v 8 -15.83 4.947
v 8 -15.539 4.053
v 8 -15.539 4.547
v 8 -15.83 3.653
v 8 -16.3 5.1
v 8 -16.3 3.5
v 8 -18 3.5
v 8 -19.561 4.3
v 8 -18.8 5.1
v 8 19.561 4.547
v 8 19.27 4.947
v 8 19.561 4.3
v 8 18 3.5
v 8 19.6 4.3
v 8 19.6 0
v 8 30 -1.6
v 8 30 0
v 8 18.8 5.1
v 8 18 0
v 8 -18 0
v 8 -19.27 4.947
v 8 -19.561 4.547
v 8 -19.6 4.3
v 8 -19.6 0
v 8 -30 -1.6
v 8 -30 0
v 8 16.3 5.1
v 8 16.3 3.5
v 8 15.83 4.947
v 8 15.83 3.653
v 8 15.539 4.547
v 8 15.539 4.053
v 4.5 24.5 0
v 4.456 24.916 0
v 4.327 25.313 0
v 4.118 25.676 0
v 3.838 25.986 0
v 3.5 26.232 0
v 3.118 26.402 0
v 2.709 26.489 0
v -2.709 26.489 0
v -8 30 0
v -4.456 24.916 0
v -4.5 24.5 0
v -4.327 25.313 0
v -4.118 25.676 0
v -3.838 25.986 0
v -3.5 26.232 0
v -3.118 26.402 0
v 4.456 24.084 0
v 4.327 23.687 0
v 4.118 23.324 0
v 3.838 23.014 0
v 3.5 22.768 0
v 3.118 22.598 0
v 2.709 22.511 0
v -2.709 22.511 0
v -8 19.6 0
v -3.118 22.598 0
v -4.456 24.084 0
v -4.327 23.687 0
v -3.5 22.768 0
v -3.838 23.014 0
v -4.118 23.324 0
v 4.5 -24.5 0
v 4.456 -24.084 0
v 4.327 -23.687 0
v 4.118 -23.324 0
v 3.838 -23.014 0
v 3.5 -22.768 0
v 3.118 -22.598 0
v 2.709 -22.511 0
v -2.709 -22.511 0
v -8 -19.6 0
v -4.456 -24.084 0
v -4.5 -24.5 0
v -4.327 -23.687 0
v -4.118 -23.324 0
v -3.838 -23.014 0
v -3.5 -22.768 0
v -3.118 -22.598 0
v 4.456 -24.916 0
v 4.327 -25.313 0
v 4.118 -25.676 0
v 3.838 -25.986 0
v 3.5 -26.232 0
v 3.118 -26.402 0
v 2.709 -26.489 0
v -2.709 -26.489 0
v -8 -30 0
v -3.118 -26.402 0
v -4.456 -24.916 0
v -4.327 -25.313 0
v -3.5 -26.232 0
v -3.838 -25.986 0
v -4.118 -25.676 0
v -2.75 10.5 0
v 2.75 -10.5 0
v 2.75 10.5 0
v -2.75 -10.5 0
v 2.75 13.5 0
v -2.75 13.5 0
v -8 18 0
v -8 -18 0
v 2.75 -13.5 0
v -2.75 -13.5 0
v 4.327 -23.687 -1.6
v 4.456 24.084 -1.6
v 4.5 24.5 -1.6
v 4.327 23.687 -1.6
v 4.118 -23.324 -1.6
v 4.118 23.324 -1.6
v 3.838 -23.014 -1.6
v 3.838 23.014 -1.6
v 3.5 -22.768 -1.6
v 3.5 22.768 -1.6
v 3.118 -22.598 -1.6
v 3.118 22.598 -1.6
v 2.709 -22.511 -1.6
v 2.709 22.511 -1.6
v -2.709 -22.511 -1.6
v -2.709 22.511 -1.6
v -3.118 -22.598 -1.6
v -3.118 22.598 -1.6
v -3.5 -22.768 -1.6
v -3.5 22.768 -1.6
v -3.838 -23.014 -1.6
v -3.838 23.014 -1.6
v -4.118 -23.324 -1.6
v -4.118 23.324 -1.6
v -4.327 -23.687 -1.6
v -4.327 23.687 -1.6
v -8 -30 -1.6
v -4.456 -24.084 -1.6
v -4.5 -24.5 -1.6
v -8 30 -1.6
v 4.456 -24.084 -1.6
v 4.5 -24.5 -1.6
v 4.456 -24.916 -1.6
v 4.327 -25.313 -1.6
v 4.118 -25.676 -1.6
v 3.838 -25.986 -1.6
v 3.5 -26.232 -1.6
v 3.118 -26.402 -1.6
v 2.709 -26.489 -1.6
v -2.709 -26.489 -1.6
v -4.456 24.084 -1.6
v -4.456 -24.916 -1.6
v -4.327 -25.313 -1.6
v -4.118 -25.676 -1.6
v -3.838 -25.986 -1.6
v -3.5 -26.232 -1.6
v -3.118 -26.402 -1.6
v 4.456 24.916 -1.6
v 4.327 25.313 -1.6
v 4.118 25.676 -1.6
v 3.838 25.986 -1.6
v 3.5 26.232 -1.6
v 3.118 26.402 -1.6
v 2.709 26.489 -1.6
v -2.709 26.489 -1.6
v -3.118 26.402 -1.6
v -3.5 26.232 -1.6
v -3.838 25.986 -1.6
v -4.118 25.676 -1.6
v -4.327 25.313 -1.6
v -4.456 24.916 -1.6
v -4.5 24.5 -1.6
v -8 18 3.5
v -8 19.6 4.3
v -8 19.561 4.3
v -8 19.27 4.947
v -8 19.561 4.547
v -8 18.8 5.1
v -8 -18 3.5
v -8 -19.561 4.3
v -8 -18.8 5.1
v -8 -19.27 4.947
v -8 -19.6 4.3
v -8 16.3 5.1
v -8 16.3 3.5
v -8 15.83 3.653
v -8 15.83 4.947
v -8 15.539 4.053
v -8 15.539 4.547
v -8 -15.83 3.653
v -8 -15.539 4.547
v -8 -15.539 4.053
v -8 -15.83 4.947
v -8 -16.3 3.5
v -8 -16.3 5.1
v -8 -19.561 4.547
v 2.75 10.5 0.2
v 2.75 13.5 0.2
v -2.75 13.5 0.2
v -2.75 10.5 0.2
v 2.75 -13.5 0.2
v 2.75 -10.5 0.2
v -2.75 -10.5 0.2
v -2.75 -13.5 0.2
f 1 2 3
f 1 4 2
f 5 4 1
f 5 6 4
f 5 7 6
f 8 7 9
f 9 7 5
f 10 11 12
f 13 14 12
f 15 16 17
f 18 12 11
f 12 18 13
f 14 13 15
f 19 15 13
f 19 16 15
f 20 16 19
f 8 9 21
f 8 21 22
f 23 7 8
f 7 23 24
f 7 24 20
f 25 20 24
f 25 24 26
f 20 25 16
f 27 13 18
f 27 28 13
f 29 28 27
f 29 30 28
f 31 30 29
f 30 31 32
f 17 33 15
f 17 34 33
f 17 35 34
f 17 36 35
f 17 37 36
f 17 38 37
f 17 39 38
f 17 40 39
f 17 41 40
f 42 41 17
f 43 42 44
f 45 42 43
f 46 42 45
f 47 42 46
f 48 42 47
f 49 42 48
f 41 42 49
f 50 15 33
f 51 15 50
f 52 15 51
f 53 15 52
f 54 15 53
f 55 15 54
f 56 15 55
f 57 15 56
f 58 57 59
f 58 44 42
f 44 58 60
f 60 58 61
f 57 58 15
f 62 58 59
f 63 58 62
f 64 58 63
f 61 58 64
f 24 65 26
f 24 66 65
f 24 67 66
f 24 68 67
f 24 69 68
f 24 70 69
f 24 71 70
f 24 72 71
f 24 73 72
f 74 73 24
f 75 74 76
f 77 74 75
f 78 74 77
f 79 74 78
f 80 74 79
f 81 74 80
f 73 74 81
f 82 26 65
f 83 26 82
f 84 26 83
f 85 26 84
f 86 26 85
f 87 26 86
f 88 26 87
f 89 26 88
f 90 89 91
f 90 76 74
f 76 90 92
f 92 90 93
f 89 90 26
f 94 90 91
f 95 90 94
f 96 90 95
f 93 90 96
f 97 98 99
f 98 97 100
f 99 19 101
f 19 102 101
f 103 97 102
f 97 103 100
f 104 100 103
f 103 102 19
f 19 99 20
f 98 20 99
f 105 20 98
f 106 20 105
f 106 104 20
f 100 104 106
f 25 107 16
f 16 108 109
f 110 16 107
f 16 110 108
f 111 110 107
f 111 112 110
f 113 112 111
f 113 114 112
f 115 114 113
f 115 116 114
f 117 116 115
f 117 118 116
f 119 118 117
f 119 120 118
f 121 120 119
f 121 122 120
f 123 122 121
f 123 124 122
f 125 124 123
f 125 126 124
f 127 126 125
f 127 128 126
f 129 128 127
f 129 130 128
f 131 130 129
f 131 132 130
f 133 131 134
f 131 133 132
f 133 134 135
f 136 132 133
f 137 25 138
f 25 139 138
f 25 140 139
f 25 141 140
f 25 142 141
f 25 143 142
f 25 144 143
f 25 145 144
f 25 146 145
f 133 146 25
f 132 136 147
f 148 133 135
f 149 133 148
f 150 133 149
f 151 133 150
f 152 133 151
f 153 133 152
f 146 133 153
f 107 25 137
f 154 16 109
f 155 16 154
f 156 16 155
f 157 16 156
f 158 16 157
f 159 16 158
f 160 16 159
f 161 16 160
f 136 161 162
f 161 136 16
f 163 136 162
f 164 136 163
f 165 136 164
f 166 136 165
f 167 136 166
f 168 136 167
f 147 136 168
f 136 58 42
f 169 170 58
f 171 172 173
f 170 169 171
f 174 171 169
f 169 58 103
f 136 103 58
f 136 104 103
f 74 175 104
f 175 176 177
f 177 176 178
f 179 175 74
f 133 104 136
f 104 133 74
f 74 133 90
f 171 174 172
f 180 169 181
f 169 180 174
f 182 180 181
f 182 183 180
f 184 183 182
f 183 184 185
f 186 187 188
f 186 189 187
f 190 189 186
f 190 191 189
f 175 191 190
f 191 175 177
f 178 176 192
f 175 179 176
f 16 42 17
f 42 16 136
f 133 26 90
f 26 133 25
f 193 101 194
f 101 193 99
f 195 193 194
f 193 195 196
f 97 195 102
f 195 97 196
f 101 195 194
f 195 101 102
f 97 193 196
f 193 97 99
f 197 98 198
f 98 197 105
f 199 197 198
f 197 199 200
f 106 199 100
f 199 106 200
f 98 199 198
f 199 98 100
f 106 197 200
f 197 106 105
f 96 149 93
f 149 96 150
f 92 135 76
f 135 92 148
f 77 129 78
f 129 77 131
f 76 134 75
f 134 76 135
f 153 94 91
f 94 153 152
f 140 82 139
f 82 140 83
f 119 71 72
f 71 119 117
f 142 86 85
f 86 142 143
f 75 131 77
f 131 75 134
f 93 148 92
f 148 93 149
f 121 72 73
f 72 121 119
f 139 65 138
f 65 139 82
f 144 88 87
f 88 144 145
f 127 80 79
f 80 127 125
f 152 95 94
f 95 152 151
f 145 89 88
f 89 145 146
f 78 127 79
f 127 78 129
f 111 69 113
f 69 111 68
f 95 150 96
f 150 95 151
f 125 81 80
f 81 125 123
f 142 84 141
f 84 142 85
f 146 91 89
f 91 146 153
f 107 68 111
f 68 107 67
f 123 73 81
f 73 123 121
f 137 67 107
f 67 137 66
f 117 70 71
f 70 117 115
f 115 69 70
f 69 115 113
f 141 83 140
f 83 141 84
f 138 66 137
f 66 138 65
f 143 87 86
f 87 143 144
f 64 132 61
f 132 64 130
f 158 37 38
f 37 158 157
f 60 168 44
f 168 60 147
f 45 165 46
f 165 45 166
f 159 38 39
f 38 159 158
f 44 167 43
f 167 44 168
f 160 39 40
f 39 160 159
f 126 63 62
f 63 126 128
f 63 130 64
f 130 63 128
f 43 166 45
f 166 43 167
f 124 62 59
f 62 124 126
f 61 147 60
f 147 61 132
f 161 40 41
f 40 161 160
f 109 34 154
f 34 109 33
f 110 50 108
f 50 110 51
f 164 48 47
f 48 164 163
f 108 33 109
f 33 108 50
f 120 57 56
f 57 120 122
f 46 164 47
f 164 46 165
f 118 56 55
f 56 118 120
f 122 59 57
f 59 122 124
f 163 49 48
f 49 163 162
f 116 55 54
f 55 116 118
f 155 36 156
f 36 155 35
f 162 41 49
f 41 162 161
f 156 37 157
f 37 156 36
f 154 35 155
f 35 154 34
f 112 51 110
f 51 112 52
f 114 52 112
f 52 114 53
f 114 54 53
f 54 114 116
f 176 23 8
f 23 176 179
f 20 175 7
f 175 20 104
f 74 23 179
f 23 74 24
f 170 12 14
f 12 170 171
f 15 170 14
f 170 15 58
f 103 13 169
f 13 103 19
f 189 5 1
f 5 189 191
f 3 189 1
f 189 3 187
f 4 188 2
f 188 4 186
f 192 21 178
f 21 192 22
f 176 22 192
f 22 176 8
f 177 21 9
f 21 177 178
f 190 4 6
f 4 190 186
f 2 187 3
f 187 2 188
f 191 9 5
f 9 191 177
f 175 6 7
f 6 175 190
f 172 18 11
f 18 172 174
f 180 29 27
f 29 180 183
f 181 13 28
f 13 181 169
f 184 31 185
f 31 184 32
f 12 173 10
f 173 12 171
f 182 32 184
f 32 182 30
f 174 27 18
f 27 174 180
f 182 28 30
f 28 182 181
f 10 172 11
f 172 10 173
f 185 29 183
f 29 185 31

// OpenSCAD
// base plate
bw=16;
bl=60;
bt=1.6;

// mount
mw=16;
ml=36;
mh=3.5;
mt=1.6;
ma=2.5; // arms

//pads
pw=5.5;
pl=3;
ph=0.2;
po=12;

// holes
hd=4;
hl=5;
ho=24.5;

module hole(offset, diam)
{
  hull()
  {
    translate([-hl/2, offset, -1]) cylinder(h=bt*2+2, d=diam, center=true, $fn=30);
    translate([ hl/2, offset, -1]) cylinder(h=bt*2+2, d=diam, center=true, $fn=30);
  }
}

//rotate([0,90,0])
{
    difference()
    {
      union()
      {
        translate([-bw/2, -bl/2, -bt]) cube([bw, bl, bt]);

        translate([0, po,0]) cube([pw, pl, ph*2], center=true);
        translate([0,-po,0]) cube([pw, pl, ph*2], center=true);
      }
      hole(-ho, hd);
      hole(ho, hd);
    }

    translate([-bw/2, -ml/2-mt, -bt]) cube([mw, mt, bt+mh+mt/2]);
    translate([-bw/2,  ml/2, -bt]) cube([mw, mt, bt+mh+mt/2]);

    hull()
    {
        translate([0, -ml/2+ma-mt/2, mh+mt/2]) rotate([0, 90, 0]) cylinder(h=mw, d=mt, center=true, $fn=10);
        translate([0, -ml/2-mt/2, mh+mt/2]) rotate([0, 90, 0]) cylinder(h=mw, d=mt, center=true, $fn=10);
    }

    hull()
    {
        translate([0, ml/2-ma+mt/2, mh+mt/2]) rotate([0, 90, 0]) cylinder(h=mw, d=mt, center=true, $fn=10);
        translate([0, ml/2+mt/2, mh+mt/2]) rotate([0, 90, 0]) cylinder(h=mw, d=mt, center=true, $fn=10);
    }
}
